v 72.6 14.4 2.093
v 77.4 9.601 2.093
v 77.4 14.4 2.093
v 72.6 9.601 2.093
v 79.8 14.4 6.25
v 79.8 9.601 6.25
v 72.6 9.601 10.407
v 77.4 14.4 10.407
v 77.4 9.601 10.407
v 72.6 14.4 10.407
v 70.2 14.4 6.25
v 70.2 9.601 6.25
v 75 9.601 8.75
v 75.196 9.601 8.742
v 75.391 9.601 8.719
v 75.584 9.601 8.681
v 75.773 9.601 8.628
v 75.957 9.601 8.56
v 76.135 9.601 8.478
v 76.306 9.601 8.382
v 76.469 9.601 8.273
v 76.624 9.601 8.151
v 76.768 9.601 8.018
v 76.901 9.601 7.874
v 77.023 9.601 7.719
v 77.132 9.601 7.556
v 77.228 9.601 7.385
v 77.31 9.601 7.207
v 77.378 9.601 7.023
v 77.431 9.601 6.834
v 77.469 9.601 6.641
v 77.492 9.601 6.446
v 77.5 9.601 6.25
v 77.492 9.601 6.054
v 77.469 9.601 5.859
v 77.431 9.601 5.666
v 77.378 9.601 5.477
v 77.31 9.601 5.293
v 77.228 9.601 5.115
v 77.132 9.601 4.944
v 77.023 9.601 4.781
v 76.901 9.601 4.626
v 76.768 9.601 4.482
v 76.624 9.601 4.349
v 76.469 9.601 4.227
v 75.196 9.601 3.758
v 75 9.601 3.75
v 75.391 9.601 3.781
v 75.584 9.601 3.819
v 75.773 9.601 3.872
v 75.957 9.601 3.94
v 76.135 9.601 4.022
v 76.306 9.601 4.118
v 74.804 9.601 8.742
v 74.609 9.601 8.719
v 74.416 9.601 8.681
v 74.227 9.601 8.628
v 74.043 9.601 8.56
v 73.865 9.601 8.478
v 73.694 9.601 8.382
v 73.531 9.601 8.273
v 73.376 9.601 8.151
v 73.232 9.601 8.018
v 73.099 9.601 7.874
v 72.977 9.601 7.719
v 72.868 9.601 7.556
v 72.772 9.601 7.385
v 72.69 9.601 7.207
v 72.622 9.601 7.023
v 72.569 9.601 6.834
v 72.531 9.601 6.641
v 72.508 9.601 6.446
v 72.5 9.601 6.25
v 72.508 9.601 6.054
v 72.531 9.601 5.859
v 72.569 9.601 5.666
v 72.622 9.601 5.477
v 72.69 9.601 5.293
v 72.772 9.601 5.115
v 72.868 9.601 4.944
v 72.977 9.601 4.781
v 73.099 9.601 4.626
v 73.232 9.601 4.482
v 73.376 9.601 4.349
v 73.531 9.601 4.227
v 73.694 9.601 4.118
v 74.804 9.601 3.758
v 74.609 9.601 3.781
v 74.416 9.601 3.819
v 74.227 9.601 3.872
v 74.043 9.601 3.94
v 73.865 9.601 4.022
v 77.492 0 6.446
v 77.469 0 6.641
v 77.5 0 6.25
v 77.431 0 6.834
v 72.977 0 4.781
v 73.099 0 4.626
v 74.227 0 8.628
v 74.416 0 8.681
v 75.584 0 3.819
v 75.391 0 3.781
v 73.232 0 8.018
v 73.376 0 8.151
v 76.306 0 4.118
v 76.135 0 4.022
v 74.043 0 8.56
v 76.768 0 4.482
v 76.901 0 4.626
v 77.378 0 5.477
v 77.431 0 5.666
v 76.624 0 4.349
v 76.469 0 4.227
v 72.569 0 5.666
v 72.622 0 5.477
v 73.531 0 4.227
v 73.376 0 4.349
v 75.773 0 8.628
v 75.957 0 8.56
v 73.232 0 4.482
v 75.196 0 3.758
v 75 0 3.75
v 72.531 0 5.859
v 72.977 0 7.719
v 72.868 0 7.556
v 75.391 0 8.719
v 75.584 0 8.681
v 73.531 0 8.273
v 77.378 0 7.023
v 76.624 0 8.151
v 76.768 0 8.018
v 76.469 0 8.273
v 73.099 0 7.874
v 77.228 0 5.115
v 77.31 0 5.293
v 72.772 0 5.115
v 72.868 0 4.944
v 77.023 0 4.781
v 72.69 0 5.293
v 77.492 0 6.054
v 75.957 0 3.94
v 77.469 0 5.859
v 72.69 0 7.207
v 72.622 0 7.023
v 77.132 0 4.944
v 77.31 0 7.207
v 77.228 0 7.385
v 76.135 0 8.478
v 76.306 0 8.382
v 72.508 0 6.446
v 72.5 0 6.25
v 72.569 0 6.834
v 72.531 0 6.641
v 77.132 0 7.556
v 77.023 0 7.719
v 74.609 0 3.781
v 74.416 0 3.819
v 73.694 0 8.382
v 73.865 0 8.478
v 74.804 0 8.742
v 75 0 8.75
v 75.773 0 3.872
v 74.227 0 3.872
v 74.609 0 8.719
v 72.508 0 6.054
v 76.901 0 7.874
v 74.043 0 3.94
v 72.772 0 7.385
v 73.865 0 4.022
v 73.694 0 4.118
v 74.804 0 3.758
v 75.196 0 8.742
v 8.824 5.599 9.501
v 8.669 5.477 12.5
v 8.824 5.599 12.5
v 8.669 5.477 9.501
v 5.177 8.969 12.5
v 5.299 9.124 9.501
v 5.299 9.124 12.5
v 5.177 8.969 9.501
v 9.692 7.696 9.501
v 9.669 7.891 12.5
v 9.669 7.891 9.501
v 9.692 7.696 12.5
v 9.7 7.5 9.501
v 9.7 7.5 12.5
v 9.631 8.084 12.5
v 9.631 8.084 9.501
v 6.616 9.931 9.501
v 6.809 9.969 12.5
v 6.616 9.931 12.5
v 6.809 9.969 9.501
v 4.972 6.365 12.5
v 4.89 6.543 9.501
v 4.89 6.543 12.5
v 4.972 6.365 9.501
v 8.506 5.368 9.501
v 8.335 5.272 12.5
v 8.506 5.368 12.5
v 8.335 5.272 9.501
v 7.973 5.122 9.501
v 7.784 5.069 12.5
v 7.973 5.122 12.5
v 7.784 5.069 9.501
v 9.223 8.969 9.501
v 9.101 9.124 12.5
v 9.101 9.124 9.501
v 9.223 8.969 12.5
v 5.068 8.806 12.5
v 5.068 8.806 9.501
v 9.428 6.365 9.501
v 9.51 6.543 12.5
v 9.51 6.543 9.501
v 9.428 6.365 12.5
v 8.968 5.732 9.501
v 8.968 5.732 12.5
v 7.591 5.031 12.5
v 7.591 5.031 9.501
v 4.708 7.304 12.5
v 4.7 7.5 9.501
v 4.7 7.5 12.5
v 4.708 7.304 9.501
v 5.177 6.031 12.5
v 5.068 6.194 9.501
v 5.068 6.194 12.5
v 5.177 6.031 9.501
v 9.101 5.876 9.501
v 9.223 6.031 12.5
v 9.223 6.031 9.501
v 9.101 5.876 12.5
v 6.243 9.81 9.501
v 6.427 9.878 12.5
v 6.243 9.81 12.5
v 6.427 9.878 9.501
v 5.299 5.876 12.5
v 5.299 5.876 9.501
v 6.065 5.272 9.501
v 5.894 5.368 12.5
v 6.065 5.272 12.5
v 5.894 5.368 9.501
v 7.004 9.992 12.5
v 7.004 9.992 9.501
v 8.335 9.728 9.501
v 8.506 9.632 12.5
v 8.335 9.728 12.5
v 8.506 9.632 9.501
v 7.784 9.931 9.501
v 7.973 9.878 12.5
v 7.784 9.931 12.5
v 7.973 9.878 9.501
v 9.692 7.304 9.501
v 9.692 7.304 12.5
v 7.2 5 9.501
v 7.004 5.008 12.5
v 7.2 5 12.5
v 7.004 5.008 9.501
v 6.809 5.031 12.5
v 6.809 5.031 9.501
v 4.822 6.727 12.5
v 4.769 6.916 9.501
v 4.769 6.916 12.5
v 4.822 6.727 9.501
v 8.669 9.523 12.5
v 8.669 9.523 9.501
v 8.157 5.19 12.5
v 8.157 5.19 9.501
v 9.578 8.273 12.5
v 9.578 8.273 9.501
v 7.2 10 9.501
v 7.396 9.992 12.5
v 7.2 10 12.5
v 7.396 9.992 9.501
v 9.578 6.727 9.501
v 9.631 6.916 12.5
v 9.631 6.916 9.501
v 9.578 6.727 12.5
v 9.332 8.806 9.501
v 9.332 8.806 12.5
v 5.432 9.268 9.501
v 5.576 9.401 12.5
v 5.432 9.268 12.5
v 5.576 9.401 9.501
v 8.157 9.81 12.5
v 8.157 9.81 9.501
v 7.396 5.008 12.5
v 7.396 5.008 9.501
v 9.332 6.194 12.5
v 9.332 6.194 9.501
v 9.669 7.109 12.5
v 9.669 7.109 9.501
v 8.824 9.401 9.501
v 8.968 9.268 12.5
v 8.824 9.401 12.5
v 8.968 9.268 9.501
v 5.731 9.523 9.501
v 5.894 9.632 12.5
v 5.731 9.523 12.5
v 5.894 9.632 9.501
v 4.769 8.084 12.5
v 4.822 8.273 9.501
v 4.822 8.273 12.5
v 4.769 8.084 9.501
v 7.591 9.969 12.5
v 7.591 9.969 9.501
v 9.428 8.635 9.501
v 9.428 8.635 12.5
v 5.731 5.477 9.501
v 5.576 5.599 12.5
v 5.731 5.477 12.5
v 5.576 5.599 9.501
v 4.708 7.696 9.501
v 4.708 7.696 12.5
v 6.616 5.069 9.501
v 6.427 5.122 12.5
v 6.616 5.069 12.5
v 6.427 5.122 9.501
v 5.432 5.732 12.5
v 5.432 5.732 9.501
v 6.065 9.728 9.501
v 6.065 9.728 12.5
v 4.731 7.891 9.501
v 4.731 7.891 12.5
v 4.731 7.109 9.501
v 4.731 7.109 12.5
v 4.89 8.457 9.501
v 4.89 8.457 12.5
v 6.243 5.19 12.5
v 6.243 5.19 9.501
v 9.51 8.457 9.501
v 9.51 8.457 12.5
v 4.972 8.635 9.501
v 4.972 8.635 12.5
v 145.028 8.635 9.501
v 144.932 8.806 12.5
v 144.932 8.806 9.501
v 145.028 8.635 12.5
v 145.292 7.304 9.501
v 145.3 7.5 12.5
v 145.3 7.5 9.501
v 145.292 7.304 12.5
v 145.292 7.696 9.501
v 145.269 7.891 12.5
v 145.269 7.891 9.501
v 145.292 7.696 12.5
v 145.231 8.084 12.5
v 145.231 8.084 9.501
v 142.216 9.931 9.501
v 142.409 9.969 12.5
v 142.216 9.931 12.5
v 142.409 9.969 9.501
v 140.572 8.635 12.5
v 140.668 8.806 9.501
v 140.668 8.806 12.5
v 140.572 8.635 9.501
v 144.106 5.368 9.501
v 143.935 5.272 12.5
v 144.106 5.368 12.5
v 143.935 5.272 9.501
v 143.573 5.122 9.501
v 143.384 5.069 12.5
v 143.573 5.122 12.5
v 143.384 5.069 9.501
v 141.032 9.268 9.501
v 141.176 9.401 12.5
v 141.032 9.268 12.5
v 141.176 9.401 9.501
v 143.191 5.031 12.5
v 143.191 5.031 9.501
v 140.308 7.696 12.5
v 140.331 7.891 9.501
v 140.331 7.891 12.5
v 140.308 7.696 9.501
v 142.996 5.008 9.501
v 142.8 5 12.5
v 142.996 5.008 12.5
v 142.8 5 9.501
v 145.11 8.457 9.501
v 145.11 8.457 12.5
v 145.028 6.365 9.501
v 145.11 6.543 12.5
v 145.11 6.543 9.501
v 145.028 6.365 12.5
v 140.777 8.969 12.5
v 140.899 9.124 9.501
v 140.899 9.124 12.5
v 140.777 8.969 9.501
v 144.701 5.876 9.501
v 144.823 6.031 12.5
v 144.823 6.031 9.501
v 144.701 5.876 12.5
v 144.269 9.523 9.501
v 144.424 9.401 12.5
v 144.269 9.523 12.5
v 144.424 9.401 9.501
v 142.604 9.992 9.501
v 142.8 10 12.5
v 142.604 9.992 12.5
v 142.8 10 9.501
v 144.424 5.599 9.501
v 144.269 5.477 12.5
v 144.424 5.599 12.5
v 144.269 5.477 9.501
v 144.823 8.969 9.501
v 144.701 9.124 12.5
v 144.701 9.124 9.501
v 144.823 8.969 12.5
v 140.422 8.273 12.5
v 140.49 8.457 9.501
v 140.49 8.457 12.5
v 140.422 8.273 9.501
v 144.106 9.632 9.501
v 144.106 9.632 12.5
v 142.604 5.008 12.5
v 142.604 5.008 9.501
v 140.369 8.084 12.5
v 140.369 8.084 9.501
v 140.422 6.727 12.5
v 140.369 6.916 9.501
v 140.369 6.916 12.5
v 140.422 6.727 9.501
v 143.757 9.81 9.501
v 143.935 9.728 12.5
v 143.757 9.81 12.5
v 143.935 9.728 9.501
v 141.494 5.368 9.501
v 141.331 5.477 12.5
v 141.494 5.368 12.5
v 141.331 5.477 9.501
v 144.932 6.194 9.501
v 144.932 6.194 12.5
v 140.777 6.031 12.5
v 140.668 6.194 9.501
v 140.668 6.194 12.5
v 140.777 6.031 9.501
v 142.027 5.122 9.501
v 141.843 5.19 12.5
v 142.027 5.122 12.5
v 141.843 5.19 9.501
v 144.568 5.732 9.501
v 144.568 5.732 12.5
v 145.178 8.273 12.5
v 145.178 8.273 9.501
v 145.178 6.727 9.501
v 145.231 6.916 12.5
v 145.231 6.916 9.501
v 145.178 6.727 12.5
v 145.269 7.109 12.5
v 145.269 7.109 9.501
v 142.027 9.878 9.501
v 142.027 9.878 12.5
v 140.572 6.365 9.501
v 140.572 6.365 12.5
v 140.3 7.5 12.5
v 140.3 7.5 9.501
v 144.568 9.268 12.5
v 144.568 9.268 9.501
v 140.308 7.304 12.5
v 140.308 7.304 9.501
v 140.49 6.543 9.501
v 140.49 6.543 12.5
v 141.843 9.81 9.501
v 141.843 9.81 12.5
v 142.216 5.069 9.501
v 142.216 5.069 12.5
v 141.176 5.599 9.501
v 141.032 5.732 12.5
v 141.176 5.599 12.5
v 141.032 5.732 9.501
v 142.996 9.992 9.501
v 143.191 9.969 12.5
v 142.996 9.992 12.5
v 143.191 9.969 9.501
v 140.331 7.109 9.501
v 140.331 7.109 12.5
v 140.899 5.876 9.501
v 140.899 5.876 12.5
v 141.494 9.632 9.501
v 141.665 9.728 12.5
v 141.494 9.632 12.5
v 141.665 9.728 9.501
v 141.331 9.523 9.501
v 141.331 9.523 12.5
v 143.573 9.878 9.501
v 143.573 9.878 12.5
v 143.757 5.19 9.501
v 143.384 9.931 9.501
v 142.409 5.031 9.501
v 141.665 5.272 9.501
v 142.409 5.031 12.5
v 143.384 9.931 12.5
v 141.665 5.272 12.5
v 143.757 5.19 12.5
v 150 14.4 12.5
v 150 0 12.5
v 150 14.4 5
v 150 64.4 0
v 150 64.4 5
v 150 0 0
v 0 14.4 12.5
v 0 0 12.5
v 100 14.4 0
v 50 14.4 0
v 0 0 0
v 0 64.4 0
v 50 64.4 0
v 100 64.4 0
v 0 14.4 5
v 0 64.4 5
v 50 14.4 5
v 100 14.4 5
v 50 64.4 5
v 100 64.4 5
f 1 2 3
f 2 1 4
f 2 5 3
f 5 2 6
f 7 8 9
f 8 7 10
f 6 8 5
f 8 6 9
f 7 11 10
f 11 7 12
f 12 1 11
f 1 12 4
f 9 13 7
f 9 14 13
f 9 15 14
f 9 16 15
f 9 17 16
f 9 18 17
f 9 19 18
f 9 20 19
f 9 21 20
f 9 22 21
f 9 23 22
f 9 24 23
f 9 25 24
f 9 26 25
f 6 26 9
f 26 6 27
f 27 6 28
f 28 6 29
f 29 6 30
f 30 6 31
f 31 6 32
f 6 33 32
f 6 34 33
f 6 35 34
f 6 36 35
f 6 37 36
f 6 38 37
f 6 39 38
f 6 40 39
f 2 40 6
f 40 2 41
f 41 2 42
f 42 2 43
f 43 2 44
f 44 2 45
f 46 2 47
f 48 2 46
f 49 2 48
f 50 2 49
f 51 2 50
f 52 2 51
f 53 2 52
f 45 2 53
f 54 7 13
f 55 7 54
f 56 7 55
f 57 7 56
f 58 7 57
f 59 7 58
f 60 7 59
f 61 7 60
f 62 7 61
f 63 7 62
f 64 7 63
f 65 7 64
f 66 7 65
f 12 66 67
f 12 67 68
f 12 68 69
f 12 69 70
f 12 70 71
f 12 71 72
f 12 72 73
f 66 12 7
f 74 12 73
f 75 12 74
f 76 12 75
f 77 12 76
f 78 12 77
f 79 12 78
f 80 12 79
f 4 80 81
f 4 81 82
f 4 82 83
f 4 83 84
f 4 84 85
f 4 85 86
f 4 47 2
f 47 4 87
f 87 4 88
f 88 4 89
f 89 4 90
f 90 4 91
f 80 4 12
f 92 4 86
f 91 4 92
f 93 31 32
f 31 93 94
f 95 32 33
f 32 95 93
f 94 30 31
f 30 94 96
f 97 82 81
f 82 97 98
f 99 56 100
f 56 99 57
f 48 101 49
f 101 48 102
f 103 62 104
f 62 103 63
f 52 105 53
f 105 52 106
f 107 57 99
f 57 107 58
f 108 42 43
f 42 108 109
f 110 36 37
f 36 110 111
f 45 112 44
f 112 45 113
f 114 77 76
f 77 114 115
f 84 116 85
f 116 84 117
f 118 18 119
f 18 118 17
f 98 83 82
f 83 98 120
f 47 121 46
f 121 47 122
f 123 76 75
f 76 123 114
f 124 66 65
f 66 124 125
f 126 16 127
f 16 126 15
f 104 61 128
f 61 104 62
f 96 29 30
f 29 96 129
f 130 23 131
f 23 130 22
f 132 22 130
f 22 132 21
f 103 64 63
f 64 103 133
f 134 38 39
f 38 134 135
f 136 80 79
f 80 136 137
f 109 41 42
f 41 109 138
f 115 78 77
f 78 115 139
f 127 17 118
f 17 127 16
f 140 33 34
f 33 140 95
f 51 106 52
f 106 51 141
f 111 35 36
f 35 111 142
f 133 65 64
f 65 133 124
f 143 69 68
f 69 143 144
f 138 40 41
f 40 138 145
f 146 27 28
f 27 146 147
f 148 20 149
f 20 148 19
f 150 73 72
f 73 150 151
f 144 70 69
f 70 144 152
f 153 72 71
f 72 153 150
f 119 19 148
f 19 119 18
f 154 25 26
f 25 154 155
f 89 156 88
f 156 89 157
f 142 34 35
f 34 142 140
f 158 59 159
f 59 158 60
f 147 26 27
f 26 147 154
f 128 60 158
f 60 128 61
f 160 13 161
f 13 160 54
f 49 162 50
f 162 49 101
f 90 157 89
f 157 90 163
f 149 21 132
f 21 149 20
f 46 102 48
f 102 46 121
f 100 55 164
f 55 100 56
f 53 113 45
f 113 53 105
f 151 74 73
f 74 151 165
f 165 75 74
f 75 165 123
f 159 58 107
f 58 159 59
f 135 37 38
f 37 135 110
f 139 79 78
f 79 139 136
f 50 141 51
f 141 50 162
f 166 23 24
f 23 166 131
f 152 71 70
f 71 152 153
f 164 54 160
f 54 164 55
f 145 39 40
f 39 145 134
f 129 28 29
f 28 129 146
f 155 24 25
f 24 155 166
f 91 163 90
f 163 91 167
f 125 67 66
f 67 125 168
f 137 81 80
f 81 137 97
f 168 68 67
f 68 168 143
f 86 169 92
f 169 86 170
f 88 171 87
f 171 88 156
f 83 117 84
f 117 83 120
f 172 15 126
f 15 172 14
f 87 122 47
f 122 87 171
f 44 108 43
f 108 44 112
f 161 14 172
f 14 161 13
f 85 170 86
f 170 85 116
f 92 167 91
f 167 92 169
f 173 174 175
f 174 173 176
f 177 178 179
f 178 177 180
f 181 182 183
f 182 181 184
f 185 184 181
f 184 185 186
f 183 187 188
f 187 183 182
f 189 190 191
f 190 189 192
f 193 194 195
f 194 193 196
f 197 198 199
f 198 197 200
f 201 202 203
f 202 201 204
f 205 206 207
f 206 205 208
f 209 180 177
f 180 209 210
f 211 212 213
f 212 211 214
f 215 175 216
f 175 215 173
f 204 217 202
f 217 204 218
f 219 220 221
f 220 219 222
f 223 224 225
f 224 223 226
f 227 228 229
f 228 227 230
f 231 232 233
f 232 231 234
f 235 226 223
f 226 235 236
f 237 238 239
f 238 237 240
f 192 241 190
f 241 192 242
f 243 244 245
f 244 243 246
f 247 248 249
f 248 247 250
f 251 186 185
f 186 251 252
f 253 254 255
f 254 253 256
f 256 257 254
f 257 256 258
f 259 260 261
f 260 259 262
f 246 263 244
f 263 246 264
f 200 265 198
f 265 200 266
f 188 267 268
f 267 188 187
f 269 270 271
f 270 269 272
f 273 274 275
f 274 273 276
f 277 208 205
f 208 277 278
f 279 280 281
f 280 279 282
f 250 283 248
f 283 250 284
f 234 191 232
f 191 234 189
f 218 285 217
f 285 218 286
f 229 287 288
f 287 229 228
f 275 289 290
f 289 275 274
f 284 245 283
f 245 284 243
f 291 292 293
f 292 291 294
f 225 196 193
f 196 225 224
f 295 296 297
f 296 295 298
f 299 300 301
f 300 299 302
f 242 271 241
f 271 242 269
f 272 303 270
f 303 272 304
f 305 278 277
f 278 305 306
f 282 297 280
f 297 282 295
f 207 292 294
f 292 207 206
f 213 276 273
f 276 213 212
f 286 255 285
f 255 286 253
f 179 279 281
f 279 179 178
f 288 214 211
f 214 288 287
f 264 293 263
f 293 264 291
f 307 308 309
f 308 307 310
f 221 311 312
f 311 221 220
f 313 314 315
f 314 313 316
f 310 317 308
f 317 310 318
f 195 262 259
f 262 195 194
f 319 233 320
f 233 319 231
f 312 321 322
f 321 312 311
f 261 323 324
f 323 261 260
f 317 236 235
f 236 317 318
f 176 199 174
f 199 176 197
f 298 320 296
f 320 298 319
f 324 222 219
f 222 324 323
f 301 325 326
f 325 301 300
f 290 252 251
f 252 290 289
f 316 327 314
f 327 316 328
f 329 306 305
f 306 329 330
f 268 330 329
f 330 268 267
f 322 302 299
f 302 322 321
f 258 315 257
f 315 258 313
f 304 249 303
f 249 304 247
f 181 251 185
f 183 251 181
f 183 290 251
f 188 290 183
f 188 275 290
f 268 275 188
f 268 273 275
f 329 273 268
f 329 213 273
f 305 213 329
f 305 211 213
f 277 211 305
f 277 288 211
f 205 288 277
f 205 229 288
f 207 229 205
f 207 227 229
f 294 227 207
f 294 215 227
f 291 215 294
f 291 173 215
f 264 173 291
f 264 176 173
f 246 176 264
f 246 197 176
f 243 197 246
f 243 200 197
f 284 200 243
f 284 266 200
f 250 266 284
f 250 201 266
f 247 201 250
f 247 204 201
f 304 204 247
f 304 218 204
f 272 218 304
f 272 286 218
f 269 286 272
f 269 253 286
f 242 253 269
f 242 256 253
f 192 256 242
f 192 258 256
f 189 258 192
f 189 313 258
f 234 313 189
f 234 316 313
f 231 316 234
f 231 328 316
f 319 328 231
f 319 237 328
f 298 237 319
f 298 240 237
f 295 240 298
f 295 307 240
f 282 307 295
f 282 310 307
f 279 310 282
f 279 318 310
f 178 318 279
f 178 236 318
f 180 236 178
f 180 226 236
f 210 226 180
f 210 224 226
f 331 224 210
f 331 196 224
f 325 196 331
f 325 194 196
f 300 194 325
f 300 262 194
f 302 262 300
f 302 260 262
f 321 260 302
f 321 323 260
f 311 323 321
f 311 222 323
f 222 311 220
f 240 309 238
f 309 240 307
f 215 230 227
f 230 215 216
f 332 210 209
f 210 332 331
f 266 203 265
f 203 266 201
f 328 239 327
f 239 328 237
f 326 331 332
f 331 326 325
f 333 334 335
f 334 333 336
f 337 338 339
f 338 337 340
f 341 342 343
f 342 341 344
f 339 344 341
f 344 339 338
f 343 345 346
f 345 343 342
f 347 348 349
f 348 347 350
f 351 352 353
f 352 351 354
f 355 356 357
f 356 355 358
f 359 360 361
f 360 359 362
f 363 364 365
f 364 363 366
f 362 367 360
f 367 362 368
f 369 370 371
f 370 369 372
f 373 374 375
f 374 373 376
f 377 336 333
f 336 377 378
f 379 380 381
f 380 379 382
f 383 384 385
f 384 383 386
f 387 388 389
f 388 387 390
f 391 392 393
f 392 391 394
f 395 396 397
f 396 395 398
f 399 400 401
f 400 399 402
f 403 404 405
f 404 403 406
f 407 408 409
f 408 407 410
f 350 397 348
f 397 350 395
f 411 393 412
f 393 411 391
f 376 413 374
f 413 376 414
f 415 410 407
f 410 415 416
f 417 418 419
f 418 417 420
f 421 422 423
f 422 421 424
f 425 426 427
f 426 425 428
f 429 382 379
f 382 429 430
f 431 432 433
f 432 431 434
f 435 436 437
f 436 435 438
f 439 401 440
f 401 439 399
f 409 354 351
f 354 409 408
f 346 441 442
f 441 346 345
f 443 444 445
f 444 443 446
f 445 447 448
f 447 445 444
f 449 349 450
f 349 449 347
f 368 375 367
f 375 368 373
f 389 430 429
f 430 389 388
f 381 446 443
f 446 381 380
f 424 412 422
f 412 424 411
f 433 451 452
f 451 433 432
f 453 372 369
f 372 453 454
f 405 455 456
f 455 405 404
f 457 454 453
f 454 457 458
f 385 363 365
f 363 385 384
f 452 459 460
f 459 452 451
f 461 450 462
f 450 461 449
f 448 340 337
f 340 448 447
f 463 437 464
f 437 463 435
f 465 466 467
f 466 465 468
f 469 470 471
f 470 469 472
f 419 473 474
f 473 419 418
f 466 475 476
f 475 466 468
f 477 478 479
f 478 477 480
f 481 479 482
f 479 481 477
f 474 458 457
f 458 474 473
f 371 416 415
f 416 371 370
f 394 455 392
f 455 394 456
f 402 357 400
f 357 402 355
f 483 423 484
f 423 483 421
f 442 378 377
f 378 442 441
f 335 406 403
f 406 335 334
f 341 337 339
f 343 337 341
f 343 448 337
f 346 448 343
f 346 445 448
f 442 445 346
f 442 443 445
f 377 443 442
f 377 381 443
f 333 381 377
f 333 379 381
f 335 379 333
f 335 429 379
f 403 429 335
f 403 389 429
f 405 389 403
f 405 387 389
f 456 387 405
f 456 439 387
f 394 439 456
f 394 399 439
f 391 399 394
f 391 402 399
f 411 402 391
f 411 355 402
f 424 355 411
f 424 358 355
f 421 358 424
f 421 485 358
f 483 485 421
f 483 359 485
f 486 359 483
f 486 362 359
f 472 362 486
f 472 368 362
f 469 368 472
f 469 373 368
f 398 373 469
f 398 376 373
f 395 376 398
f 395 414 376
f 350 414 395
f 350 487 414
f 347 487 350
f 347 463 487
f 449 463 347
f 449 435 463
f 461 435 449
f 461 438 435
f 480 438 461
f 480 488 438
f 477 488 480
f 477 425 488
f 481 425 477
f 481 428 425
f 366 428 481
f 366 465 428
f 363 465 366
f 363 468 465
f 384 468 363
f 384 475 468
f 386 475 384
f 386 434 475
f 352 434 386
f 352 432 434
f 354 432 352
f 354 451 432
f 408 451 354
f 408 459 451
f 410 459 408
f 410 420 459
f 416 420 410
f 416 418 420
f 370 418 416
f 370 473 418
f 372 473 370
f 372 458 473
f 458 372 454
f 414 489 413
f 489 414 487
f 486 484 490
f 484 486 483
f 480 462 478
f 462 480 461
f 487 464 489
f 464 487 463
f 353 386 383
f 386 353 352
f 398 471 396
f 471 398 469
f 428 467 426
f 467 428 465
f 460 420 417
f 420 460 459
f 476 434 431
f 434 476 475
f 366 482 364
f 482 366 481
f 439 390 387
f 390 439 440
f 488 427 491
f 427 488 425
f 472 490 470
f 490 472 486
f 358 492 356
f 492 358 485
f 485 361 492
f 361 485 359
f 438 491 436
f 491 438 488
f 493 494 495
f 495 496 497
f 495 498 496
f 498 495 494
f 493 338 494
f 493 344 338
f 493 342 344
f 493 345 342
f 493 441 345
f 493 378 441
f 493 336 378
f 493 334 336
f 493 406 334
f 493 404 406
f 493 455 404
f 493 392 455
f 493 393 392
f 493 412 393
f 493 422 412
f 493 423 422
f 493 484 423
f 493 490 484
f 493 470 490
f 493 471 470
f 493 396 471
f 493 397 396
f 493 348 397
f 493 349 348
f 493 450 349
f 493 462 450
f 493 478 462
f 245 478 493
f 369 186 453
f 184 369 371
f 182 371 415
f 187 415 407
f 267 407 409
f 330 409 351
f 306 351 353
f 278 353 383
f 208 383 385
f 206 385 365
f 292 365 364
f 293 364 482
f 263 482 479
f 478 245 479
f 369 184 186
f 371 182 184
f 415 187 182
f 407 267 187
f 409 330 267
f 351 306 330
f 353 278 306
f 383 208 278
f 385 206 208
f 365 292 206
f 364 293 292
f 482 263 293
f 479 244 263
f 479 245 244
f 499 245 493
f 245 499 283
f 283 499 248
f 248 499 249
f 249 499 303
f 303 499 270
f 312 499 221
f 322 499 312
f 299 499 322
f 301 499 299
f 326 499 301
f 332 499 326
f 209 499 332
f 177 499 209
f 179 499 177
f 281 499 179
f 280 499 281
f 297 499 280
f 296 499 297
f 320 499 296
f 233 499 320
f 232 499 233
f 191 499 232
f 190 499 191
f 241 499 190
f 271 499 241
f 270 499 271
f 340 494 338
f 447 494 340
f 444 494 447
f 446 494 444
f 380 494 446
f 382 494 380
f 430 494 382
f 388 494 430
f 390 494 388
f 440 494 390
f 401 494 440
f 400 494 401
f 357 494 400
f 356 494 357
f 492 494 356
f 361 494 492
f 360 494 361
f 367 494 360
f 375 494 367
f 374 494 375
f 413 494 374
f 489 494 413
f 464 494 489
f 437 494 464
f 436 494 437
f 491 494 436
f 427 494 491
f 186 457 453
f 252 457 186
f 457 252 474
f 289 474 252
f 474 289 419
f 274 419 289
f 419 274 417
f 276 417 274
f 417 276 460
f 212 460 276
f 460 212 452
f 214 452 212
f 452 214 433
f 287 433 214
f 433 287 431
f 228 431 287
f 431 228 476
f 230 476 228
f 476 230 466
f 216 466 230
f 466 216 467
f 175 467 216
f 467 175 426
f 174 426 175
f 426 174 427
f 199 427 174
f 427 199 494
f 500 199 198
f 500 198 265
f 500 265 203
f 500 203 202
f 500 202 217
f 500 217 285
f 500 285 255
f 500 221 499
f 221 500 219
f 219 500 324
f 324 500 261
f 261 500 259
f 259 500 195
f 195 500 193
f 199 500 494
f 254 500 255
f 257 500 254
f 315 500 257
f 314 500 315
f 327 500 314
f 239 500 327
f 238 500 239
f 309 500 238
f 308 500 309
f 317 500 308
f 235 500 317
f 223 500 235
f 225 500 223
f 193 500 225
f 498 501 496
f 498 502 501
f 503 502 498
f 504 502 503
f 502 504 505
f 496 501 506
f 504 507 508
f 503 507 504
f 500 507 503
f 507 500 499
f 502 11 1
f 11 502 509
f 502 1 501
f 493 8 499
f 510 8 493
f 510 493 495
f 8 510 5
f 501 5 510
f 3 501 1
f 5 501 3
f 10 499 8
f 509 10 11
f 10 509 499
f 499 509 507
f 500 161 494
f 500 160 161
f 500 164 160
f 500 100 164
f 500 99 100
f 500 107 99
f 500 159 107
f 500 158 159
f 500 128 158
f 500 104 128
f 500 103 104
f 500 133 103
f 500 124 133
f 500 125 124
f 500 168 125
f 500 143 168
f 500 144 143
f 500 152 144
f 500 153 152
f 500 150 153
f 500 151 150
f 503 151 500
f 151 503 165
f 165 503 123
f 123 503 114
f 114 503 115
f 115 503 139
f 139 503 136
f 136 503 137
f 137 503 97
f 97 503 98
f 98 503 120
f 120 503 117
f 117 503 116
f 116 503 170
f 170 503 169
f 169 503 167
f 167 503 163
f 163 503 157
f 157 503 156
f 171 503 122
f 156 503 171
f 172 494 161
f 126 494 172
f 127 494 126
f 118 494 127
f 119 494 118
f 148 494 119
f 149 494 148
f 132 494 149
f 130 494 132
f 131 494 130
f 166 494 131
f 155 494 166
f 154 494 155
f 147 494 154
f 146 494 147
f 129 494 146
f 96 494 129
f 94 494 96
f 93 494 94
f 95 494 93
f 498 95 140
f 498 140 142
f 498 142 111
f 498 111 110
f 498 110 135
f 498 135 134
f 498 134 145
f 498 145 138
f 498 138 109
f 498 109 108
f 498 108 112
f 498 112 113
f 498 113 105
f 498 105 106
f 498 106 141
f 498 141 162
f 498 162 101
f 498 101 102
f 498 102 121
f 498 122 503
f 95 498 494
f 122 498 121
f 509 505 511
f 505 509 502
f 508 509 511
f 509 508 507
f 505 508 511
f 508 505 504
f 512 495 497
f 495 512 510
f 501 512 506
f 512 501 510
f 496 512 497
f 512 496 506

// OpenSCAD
// file: Modules.scad
/*
 * Jig to hold a model airplane while working on it.
 *
 * Vertical sections slide horizonally. Horizontal dimensions are scalable
 * by adding one or more extension bars.
 *
 * Wing supports clamp magnetically. Be sure to glue some felt on the
 * insides of the wing supports to protect the model
 *
 * ©Louis Kowolowski 2020
 */

module tail_holder () {
	translate ([3*bar_w, 0, 10]) {
		rotate ([0, 180, 0]) {
			tail_holder_bottom ();
		}
	}
	// height is +5 (thickness of top) because its been flipped over
	translate ([0, 0, -7]) {
		tail_holder_top ();
	}
}

module tail_holder_bottom () {
	difference () {
		cube ([3*bar_w, 1.5*bar_screw_head_d, bar_w/4]);

		union () {
			// screw/nut hole
			translate ([1.5*bar_w, 1.5*bar_screw_head_d+0.001, bar_w/8]) {
				rotate ([90, 0, 0]) {
					bar_screw ();
				}
			}
			// left magnet hole
			translate ([0.75*bar_screw_head_d, 1.5*bar_screw_d, bar_w/4-magnet_h+0.001]) {
				cylinder (magnet_h, d=magnet_d, $fn=80);
			}
			// right magnet hole
			translate ([(3*bar_w)-(0.75*bar_screw_head_d), 1.5*bar_screw_d, bar_w/4-magnet_h+0.001]) {
				cylinder (magnet_h, d=magnet_d, $fn=80);
			}
		}
	}
	// left side
	translate ([0, 1.5*bar_screw_head_d, 0]) {
		cube ([bar_w, bar_w, 5]);
	}

	// right side
	translate ([2*bar_w, 1.5*bar_screw_head_d, 0]) {
		cube ([bar_w, bar_w, 5]);
	}

}

module tail_holder_top () {

	difference () {
		cube ([3*bar_w, 1.5*bar_screw_head_d, 5]);
		union () {
			// left magnet hole
			translate ([0.75*bar_screw_head_d, 1.5*bar_screw_d, 5.001-magnet_h]) {
				cylinder (magnet_h, d=magnet_d, $fn=80);
			}
			// right magnet hole
			translate ([(3*bar_w)-(0.75*bar_screw_head_d), 1.5*bar_screw_d, 5.001-magnet_h]) {
				cylinder (magnet_h, d=magnet_d, $fn=80);
			}
		}
	}
	// left side
	translate ([0, 1.5*bar_screw_head_d, 0]) {
		cube ([bar_w, bar_w, 5]);
	}

	// right side
	translate ([2*bar_w, 1.5*bar_screw_head_d, 0]) {
		cube ([bar_w, bar_w, 5]);
	}
}

module nose_holder () {
	difference () {
		union () {
			cube ([bar_w, bar_w, 6]);
			translate ([0, 0, 6]) {
				// rear block to house screw/nut holder and magnets for top
				cube ([bar_screw_head_d, bar_w, 1.5*bar_screw_head_d]);
			}
			translate ([0, 0, 6]) {
				// rear block to house screw/nut holder and magnets for top
				cube ([bar_w, bar_w, 1.5*bar_screw_head_d]);
			}
		}
		union () {
			// screw/nut hole
			translate ([bar_screw_head_d+1, bar_w/2, 10]) {
				rotate ([0, 270, 0]) {
					bar_screw ();
				}
			}
			// angled cut to hold nose centered in jib
			translate ([bar_w/2+.5*bar_screw_head_d+0.001, bar_w/2, bar_w/2-5]) {
				rotate ([270, 210, 90]) {
					Triangle(a=bar_w, b=bar_w, angle=120, height=bar_w-bar_screw_head_d+0.001, centerXYZ=[true,true,true]);
				}
			}
			
		}
	}
}


module wing_holder () {
	wing_holder_bottom ();

	translate ([0, 0, 1.5*bar_screw_head_d+2]) {
		wing_holder_top ();
	}
}

module wing_holder_bottom () {
	// slides up and down the riser to hold the wing at the correct height
	difference () {
		union () {
			cube ([bar_w, bar_w, 6]);
			translate ([0, 0, 6]) {
				// rear block to house screw/nut holder and magnets for top
				// add 1 to height for room above the nut
				cube ([bar_screw_head_d, bar_w, bar_screw_head_d+1]);
			}
		}
		union () {
			// screw/nut hole
			translate ([bar_screw_head_d+1, bar_w/2, 11]) {
				rotate ([0, 270, 0]) {
					bar_screw ();
				}
			}
			// magnet mounting holes
			translate ([magnet_d/2+2, magnet_d, bar_screw_head_d+4.001]) {
				rotate ([0, 0, 90]) {
					cylinder (magnet_h, d=magnet_d, $fn=80);
				}
			}
			// magnet mounting holes
			translate ([magnet_d/2+2, bar_w-magnet_d, bar_screw_head_d+4.001]) {
				rotate ([0, 0, 90]) {
					cylinder (magnet_h, d=magnet_d, $fn=80);
				}
			}
		}
	}
}

module wing_holder_top () {
	difference () {
		cube ([bar_w, bar_w, 6]);
		union () {
			// magnet mounting holes
			translate ([bar_w-magnet_d, magnet_d, -1*0.001]) {
				rotate ([0, 0, 90]) {
					cylinder (magnet_h, d=magnet_d, $fn=80);
				}
			}
			// magnet mounting holes
			translate ([bar_w-magnet_d, bar_w-magnet_d, -1*0.001]) {
				rotate ([0, 0, 90]) {
					cylinder (magnet_h, d=magnet_d, $fn=80);
				}
			}
		}
	}
}

module riser () {
	/* vertical bar that will slide forward/backward on the base and hold the
	 * horizontal rest(s) for the model
	 */
	difference () {
		// base
		cube ([riser_w, riser_w, riser_w/4]);	
		union () {
			// slot at bottom for guide on bar
			translate ([riser_w/4, -1*0.001, -1*0.01]) {
				cube ([riser_w/2, riser_w+1, 5.01]);
			}
			// cross slot at bottom for guide on bar
			translate ([-0.001, riser_w/4, -1*0.01]) {
				cube ([riser_w+1, riser_w/2, 5.01]);
			}
			// screw hole
			translate ([riser_w/2, riser_w/2, -1*bar_screw_head_h]) {
				bar_screw ();
			}
		}
	}
	difference () {
		// vartical riser
		translate ([0, 0, riser_w/4]) {
			cube ([riser_w, riser_w/8, riser_l]);
		}
		// screw slot
		translate ([riser_w/2-bar_screw_d/2, -1, riser_w]) {
			cube ([bar_screw_d, riser_w/4+1, riser_l-riser_w]);
		}
	}
}

module bar_screw () {
	// Model of a screw and hex head/nut

	// screw head
	cylinder(bar_screw_head_h, d=bar_screw_head_d, $fn=6);
	translate ([0, 0, 0]) {
		// screw body
		cylinder(bar_screw_h, d=bar_screw_d, $fn=80);
	}
}

module bar () {
	/* lower base unit. Comes together as a cross. Each bar can be extended with
	 * additional bars.
	 * Raised section acts as a guide for the riser. Slot down the middle is for
	 * a clamping butterfly screw.
	 */
	difference () {
		union () {
			cube ([bar_l, bar_w, bar_h]);
			translate ([0, bar_w/4, 0]) {
				// guide slot
				cube ([bar_l, bar_w/2, bar_h+5]);
			}
		}
		translate ([1, bar_w/2-bar_screw_d/2, -0.001]) {
			cube ([bar_l-2, bar_screw_d, bar_screw_h]);
		}
		translate ([1, bar_w/2-bar_screw_head_d/2, -0.001]) {
			 cube ([bar_l, bar_screw_head_d, bar_screw_head_h+1]);
		}
	}
	// upper extension
	difference () {
		translate ([bar_l, 0, bar_h/2]) {
			cube ([bar_w/4, bar_w, bar_h/2]);
		}
		union () {
			// 2 screw holes
			// left
			translate ([bar_l+bar_w/8, bar_w/8, -1*0.001]) {
				bar_screw ();
			}
			// right
			translate ([bar_l+bar_w/8, bar_w-bar_w/8, -1*0.001]) {
				bar_screw ();
			}
		}
	}
	// lower extension
	difference () {
		translate ([-1*bar_w/4, 0, 0]) {
			cube ([bar_w/4, bar_w, bar_h/2]);
		}
		union () {
			// 2 screw holes
			// left
			translate ([-1*bar_w/4+bar_w/8, bar_w/8, -1*0.001]) {
				bar_screw ();
			}
			// right
			translate ([-1*bar_w/4+bar_w/8, bar_w-bar_w/8, -1*0.001]) {
				bar_screw ();
			}
		}
	}

}

module Triangle(
			a, b, angle, height=1, heights=undef,
			center=undef, centerXYZ=[false,false,false]) {
	// Calculate Heights at each point
	heightAB = ((heights==undef) ? height : heights[0])/2;
	heightBC = ((heights==undef) ? height : heights[1])/2;
	heightCA = ((heights==undef) ? height : heights[2])/2;
	centerZ = (center || (center==undef && centerXYZ[2]))?0:max(heightAB,heightBC,heightCA);

	// Calculate Offsets for centering
	offsetX = (center || (center==undef && centerXYZ[0]))?((cos(angle)*a)+b)/3:0;
	offsetY = (center || (center==undef && centerXYZ[1]))?(sin(angle)*a)/3:0;
	
	pointAB1 = [-offsetX,-offsetY, centerZ-heightAB];
	pointAB2 = [-offsetX,-offsetY, centerZ+heightAB];
	pointBC1 = [b-offsetX,-offsetY, centerZ-heightBC];
	pointBC2 = [b-offsetX,-offsetY, centerZ+heightBC];
	pointCA1 = [(cos(angle)*a)-offsetX,(sin(angle)*a)-offsetY, centerZ-heightCA];
	pointCA2 = [(cos(angle)*a)-offsetX,(sin(angle)*a)-offsetY, centerZ+heightCA];

	polyhedron(
		points=[	pointAB1, pointBC1, pointCA1,
					pointAB2, pointBC2, pointCA2 ],
		faces=[	
			[0, 1, 2],
			[3, 5, 4],
			[0, 3, 1],
			[1, 3, 4],
			[1, 4, 2],
			[2, 4, 5],
			[2, 5, 0],
			[0, 5, 3] ] );
}
// file: Globals.scad
/*
 * Global variables used for all the models
 * All units are in mm
 *
 * Jig to hold a model airplane while working on it.
 *
 * Vertical sections slide horizonally. Horizontal dimensions are scalable
 * by adding one or more extension bars.
 *
 * Wing supports clamp magnetically. Be sure to glue some felt on the
 * insides of the wing supports to protect the model
 *
 * ©Louis Kowolowski 2020
 */

/* long dimensions are constrained by the size of the print bed
 */
bar_l = 175;
bar_w = 50;
bar_h = 13;

riser_l = 150;
riser_w = 50;
riser_h = 12;

// M5x20
bar_screw_head_h = 4.8;
bar_screw_head_d = 9.6;
bar_screw_h = 20;
bar_screw_d = 5;

guide_rail_l = bar_l;
guide_rail_w = bar_w/2;
guide_rail_h = 2;

magnet_h = 3;
magnet_d = 5;
// main file
/*
 * Jig to hold a model airplane while working on it.
 *
 * Vertical sections slide horizonally. Horizontal dimensions are scalable
 * by adding one or more extension bars.
 *
 * Wing supports clamp magnetically. Be sure to glue some felt on the
 * insides of the wing supports to protect the model
 *
 * ©Louis Kowolowski 2020
 */

/*
 * Include globals and modules
 */
include <Globals.scad>;
include <Modules.scad>;

tail_holder_bottom ();
